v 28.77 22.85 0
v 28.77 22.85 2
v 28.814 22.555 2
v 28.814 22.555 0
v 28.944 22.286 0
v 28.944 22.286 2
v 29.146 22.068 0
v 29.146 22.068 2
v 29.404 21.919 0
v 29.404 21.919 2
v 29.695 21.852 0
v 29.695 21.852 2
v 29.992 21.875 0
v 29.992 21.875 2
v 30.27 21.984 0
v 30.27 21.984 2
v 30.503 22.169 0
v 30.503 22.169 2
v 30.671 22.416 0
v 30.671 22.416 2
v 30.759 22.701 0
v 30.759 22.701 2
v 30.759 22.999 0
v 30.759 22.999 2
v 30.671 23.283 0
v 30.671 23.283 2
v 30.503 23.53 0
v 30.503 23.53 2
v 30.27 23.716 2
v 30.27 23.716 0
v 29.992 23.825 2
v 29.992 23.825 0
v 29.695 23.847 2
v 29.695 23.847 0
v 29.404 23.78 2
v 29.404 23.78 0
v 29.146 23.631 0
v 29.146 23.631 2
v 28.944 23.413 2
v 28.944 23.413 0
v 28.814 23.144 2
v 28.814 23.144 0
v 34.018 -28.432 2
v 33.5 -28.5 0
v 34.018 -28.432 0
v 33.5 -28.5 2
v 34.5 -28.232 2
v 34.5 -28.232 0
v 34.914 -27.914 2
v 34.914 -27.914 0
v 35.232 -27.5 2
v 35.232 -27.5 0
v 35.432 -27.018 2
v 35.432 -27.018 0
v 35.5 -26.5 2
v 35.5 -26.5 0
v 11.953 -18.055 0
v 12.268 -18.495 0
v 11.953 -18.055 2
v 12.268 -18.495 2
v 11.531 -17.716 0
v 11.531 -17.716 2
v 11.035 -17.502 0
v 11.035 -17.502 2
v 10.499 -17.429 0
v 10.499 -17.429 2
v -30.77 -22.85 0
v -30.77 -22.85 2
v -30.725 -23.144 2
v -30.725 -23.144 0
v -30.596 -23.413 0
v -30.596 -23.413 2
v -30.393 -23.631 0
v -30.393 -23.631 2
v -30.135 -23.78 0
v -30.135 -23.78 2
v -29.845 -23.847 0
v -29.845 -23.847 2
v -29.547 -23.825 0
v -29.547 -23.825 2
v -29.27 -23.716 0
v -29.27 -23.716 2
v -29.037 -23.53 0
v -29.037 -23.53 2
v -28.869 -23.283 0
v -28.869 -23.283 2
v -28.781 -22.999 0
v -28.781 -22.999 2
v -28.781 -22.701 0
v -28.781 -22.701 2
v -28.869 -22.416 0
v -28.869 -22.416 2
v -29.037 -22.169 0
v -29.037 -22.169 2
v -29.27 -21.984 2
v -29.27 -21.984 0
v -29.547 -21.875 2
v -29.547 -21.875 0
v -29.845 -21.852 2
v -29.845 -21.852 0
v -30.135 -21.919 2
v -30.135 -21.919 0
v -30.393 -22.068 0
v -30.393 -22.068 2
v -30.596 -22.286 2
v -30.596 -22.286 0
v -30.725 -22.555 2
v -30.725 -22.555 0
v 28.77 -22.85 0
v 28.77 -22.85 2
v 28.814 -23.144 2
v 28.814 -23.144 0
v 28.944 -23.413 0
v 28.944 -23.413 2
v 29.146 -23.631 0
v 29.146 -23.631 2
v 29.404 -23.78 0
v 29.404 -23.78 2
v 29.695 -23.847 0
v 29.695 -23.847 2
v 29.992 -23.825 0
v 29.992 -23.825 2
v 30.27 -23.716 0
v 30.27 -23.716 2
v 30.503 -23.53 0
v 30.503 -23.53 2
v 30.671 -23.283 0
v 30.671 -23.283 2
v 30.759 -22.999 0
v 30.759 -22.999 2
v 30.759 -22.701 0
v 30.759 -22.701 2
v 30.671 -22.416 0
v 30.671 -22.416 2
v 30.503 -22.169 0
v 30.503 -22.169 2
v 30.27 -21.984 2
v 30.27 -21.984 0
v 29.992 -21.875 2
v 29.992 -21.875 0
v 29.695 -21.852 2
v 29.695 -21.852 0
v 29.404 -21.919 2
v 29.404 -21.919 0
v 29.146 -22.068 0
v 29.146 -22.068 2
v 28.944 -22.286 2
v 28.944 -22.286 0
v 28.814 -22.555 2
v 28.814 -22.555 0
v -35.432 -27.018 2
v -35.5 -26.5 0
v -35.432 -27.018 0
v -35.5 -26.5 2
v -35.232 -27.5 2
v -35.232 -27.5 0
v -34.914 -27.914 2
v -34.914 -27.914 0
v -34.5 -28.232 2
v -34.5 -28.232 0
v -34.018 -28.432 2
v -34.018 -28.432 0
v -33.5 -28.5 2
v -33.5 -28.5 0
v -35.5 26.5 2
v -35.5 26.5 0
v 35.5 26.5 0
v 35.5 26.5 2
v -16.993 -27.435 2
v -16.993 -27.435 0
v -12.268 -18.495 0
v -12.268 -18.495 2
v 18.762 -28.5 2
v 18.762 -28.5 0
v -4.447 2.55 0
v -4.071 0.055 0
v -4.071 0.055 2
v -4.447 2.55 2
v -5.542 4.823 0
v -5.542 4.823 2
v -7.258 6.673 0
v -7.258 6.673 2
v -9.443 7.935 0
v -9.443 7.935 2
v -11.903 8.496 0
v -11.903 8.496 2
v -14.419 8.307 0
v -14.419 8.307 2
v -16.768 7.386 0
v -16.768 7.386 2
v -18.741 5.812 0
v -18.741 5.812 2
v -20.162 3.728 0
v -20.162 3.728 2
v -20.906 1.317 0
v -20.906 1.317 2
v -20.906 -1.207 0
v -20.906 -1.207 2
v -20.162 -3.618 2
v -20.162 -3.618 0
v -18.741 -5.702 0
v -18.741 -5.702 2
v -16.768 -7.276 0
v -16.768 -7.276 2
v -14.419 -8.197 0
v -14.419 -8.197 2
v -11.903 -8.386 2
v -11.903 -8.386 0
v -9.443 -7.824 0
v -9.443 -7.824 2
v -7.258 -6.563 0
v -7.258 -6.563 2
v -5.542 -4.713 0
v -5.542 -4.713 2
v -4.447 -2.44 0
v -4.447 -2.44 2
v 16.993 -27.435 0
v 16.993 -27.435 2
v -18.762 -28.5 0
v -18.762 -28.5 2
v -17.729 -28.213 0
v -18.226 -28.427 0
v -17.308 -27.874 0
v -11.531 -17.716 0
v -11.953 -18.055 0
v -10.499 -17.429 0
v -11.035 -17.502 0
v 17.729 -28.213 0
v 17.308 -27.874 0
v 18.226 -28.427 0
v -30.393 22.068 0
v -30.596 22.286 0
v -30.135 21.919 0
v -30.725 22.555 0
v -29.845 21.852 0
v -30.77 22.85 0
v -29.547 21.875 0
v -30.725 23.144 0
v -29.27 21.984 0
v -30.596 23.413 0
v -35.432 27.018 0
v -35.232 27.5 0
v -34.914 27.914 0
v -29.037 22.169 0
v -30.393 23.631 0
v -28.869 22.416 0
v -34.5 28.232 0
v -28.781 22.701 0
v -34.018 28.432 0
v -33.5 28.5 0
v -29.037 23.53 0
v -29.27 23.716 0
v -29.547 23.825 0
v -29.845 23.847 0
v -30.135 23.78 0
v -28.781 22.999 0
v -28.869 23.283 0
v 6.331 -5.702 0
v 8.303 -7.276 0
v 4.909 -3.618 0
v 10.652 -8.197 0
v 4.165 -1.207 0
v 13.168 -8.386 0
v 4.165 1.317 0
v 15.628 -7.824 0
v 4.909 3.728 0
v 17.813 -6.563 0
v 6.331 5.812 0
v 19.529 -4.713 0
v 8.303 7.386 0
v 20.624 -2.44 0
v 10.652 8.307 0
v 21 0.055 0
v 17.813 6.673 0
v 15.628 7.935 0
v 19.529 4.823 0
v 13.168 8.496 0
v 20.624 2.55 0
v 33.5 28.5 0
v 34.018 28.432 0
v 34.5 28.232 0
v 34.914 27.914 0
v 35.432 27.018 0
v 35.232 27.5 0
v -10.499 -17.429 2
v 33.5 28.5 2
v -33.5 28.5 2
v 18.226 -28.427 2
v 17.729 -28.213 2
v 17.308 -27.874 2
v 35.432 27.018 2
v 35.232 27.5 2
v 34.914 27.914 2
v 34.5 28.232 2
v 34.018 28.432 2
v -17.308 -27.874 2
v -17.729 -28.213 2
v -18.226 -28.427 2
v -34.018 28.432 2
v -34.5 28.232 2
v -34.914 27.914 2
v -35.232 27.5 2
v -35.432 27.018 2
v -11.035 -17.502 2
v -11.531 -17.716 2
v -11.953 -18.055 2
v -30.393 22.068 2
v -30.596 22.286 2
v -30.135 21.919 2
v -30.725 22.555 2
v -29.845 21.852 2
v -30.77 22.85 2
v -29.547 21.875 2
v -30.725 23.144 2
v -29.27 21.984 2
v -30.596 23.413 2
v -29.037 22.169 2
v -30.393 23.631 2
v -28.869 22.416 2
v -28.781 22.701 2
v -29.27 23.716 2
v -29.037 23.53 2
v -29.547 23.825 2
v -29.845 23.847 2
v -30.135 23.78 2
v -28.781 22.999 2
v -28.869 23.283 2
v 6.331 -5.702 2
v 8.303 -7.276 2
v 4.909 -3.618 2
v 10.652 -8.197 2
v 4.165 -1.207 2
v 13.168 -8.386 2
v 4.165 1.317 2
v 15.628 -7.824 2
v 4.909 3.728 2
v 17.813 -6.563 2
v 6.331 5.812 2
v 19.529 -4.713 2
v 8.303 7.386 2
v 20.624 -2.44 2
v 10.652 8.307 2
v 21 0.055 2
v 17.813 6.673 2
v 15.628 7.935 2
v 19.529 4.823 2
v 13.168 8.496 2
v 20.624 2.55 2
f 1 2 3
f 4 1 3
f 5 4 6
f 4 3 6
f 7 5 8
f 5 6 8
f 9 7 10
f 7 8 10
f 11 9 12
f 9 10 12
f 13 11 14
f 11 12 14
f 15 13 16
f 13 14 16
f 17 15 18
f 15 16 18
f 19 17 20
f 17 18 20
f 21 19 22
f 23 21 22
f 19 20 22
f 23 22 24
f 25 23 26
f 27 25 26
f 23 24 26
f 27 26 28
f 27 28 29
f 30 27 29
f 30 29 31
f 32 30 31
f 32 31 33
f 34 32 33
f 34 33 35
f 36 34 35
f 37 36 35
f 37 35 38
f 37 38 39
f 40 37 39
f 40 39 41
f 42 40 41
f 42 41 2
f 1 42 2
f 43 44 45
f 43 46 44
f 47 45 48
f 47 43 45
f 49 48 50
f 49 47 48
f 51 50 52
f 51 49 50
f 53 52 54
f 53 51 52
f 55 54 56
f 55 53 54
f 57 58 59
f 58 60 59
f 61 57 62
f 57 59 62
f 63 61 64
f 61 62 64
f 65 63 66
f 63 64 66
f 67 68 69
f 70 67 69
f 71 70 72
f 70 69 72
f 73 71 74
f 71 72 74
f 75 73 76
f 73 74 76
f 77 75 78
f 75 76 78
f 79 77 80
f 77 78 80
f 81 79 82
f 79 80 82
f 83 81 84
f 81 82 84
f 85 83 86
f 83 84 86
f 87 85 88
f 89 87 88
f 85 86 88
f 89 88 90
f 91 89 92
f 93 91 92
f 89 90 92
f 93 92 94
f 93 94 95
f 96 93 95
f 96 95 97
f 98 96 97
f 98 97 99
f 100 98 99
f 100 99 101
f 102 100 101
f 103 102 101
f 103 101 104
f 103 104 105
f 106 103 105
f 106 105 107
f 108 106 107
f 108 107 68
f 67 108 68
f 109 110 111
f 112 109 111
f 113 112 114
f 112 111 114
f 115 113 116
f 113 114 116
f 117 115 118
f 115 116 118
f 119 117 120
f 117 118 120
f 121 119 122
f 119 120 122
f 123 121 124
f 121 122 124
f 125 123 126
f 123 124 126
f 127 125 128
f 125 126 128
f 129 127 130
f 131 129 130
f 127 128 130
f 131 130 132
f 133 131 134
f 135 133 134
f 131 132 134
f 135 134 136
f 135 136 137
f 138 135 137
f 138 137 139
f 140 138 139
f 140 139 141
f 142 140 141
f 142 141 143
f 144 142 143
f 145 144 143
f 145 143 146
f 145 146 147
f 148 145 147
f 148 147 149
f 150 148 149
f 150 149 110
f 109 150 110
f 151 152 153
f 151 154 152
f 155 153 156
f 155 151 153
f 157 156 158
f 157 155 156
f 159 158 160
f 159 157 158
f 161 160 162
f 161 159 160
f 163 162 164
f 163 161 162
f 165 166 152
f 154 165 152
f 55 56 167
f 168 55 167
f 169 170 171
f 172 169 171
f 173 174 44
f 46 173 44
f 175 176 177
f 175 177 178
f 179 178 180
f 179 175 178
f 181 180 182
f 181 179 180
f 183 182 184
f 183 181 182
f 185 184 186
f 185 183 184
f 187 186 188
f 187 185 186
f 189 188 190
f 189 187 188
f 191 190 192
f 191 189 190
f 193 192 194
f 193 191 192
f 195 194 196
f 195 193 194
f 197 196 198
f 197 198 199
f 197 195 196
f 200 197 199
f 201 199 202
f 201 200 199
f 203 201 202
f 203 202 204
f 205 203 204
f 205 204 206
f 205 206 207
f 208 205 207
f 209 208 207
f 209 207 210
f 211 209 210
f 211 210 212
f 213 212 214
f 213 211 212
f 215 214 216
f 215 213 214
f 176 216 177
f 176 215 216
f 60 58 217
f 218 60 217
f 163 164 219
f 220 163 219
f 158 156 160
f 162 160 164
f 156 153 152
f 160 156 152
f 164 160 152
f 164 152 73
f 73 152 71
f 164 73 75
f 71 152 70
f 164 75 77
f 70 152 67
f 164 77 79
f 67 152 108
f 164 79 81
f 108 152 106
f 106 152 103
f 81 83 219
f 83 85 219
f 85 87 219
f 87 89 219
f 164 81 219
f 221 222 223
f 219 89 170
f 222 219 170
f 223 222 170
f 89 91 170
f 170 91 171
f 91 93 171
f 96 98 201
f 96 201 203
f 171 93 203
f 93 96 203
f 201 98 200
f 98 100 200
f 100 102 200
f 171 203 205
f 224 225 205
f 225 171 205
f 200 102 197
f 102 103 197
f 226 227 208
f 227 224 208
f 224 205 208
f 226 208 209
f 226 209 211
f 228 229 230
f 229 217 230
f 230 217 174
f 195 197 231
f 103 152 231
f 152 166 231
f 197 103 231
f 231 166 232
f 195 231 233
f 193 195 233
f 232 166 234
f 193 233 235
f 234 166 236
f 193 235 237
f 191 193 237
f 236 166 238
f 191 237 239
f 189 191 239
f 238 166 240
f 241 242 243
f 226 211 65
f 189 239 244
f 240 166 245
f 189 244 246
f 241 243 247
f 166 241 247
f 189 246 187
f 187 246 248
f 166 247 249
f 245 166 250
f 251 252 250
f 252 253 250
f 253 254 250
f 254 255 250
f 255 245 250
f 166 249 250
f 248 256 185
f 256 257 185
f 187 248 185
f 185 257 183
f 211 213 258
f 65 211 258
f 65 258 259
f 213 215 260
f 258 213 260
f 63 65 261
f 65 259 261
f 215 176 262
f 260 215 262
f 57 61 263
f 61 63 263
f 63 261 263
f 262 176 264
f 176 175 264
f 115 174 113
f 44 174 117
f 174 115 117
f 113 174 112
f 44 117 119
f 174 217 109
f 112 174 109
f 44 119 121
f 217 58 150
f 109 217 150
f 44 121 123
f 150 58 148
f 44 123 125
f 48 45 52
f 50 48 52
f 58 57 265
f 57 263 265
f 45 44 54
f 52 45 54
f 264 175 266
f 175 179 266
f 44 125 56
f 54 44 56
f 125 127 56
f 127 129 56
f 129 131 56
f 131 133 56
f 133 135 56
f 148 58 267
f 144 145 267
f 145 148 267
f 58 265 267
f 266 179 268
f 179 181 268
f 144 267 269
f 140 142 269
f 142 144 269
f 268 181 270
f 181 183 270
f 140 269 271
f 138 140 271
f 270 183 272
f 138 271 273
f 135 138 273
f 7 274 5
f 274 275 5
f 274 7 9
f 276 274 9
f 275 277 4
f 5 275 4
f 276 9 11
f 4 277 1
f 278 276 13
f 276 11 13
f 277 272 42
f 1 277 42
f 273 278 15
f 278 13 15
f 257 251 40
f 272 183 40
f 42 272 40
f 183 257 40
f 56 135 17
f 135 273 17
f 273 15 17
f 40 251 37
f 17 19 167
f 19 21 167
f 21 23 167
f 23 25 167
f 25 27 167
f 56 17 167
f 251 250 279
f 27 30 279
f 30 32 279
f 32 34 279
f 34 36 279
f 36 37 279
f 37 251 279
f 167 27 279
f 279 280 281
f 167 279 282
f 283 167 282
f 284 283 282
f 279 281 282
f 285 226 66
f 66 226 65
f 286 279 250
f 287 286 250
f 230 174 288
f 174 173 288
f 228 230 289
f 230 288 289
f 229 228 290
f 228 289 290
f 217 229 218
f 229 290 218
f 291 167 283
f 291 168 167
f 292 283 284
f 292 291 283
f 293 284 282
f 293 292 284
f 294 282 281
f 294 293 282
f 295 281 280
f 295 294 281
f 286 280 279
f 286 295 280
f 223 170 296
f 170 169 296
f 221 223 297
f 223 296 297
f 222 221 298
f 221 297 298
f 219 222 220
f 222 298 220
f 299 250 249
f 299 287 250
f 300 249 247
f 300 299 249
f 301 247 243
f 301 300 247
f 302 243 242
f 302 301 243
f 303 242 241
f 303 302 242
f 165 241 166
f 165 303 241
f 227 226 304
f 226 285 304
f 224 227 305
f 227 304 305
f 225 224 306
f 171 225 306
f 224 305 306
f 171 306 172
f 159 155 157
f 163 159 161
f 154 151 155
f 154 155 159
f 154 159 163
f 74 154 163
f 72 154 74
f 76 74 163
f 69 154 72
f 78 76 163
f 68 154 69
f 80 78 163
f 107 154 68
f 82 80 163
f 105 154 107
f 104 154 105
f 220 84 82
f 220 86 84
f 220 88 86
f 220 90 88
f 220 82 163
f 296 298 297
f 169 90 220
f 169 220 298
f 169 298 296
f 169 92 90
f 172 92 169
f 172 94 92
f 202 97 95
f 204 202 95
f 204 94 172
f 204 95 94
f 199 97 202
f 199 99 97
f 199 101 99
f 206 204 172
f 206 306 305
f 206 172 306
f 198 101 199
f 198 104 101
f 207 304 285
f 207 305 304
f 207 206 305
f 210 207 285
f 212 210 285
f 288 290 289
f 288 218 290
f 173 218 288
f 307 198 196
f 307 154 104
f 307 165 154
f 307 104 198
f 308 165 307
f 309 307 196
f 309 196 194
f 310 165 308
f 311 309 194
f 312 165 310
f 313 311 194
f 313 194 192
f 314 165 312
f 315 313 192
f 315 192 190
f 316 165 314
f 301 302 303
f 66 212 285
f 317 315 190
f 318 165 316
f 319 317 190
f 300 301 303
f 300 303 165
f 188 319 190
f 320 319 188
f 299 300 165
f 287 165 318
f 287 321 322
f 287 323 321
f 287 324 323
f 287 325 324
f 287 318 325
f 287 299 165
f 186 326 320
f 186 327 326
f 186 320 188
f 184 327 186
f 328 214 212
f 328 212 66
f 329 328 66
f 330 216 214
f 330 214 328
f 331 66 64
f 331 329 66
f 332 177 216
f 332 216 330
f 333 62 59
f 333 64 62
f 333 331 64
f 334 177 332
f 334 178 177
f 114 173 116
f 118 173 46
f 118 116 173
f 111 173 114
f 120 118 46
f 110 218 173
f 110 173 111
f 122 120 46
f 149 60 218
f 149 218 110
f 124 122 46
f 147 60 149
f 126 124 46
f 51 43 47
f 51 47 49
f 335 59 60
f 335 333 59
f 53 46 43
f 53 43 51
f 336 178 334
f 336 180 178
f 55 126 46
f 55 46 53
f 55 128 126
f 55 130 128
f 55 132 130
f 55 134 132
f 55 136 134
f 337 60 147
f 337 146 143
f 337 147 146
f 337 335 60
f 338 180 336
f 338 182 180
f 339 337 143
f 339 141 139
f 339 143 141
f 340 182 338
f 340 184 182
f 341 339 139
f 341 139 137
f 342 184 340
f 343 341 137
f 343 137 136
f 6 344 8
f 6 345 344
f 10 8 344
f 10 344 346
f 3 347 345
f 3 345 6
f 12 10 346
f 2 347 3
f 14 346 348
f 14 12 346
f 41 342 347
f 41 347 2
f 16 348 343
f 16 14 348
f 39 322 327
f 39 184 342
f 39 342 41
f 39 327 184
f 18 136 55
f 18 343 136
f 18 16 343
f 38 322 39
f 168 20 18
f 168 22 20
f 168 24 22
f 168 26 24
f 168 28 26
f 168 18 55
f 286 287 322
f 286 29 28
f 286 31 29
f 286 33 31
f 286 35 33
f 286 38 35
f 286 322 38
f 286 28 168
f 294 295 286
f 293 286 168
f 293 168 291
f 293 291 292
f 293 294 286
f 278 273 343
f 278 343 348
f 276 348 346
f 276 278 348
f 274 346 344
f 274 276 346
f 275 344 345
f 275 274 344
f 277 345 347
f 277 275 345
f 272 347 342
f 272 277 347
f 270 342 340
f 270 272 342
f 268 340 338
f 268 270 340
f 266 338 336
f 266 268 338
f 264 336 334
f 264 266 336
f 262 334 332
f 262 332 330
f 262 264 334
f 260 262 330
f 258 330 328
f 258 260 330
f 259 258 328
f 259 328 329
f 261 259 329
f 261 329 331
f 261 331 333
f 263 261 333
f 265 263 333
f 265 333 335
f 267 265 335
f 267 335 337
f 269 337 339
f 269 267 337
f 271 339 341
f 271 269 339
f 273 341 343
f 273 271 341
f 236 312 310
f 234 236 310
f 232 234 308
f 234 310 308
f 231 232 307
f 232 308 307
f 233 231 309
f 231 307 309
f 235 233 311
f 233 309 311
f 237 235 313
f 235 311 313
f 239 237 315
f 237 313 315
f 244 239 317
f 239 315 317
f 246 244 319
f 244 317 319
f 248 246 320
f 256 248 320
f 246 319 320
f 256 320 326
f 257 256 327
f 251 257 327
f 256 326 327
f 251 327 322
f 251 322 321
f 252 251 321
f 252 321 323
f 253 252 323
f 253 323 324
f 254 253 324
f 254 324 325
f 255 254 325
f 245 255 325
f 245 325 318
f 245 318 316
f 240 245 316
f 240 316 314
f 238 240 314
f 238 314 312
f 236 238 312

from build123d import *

# Parameters (mm, degrees)
F0_R     = 8.464637
F1_DEPTH = 2
F2_R     = 2
F3_D     = 2


with BuildPart() as f1:
    # F0 (on Top) → F1 (new body)
    with BuildSketch(Plane.XY):
        Polygon((17.556544, -28.5), (35.5, -28.5), (35.5, 28.5), (-35.5, 28.5), (-35.5, -28.5), (-17.556544, -28.5), (-11.704362, -17.429322), (0, -17.429322), (11.704362, -17.429322), align=None)
        with Locations((-12.535542, 0.055034)):
            Circle(F0_R, mode=Mode.SUBTRACT)
        with Locations((12.535542, 0.055034)):
            Circle(F0_R, mode=Mode.SUBTRACT)
    extrude(amount=F1_DEPTH)

    # F2
    f2_edges = [f1.edges().sort_by_distance(p)[0] for p in [
        (-35.5, 28.5, 1),
        (-35.5, -28.5, 1),
        (-17.556544, -28.5, 1),
        (-11.704362, -17.429322, 1),
        (11.704362, -17.429322, 1),
        (17.556544, -28.5, 1),
        (35.5, -28.5, 1),
        (35.5, 28.5, 1),
    ]]
    fillet(f2_edges, radius=F2_R)

    # F3 (through all)
    with Locations(Plane(origin=(0, 0, 0), x_dir=(1, 0, 0), z_dir=(0, 0, -1))):
        with Locations((-29.769791, 22.849604), (29.769791, 22.849604), (29.769791, -22.849604), (-29.769791, -22.849604)):
            Hole(F3_D / 2)


solid = f1.part
